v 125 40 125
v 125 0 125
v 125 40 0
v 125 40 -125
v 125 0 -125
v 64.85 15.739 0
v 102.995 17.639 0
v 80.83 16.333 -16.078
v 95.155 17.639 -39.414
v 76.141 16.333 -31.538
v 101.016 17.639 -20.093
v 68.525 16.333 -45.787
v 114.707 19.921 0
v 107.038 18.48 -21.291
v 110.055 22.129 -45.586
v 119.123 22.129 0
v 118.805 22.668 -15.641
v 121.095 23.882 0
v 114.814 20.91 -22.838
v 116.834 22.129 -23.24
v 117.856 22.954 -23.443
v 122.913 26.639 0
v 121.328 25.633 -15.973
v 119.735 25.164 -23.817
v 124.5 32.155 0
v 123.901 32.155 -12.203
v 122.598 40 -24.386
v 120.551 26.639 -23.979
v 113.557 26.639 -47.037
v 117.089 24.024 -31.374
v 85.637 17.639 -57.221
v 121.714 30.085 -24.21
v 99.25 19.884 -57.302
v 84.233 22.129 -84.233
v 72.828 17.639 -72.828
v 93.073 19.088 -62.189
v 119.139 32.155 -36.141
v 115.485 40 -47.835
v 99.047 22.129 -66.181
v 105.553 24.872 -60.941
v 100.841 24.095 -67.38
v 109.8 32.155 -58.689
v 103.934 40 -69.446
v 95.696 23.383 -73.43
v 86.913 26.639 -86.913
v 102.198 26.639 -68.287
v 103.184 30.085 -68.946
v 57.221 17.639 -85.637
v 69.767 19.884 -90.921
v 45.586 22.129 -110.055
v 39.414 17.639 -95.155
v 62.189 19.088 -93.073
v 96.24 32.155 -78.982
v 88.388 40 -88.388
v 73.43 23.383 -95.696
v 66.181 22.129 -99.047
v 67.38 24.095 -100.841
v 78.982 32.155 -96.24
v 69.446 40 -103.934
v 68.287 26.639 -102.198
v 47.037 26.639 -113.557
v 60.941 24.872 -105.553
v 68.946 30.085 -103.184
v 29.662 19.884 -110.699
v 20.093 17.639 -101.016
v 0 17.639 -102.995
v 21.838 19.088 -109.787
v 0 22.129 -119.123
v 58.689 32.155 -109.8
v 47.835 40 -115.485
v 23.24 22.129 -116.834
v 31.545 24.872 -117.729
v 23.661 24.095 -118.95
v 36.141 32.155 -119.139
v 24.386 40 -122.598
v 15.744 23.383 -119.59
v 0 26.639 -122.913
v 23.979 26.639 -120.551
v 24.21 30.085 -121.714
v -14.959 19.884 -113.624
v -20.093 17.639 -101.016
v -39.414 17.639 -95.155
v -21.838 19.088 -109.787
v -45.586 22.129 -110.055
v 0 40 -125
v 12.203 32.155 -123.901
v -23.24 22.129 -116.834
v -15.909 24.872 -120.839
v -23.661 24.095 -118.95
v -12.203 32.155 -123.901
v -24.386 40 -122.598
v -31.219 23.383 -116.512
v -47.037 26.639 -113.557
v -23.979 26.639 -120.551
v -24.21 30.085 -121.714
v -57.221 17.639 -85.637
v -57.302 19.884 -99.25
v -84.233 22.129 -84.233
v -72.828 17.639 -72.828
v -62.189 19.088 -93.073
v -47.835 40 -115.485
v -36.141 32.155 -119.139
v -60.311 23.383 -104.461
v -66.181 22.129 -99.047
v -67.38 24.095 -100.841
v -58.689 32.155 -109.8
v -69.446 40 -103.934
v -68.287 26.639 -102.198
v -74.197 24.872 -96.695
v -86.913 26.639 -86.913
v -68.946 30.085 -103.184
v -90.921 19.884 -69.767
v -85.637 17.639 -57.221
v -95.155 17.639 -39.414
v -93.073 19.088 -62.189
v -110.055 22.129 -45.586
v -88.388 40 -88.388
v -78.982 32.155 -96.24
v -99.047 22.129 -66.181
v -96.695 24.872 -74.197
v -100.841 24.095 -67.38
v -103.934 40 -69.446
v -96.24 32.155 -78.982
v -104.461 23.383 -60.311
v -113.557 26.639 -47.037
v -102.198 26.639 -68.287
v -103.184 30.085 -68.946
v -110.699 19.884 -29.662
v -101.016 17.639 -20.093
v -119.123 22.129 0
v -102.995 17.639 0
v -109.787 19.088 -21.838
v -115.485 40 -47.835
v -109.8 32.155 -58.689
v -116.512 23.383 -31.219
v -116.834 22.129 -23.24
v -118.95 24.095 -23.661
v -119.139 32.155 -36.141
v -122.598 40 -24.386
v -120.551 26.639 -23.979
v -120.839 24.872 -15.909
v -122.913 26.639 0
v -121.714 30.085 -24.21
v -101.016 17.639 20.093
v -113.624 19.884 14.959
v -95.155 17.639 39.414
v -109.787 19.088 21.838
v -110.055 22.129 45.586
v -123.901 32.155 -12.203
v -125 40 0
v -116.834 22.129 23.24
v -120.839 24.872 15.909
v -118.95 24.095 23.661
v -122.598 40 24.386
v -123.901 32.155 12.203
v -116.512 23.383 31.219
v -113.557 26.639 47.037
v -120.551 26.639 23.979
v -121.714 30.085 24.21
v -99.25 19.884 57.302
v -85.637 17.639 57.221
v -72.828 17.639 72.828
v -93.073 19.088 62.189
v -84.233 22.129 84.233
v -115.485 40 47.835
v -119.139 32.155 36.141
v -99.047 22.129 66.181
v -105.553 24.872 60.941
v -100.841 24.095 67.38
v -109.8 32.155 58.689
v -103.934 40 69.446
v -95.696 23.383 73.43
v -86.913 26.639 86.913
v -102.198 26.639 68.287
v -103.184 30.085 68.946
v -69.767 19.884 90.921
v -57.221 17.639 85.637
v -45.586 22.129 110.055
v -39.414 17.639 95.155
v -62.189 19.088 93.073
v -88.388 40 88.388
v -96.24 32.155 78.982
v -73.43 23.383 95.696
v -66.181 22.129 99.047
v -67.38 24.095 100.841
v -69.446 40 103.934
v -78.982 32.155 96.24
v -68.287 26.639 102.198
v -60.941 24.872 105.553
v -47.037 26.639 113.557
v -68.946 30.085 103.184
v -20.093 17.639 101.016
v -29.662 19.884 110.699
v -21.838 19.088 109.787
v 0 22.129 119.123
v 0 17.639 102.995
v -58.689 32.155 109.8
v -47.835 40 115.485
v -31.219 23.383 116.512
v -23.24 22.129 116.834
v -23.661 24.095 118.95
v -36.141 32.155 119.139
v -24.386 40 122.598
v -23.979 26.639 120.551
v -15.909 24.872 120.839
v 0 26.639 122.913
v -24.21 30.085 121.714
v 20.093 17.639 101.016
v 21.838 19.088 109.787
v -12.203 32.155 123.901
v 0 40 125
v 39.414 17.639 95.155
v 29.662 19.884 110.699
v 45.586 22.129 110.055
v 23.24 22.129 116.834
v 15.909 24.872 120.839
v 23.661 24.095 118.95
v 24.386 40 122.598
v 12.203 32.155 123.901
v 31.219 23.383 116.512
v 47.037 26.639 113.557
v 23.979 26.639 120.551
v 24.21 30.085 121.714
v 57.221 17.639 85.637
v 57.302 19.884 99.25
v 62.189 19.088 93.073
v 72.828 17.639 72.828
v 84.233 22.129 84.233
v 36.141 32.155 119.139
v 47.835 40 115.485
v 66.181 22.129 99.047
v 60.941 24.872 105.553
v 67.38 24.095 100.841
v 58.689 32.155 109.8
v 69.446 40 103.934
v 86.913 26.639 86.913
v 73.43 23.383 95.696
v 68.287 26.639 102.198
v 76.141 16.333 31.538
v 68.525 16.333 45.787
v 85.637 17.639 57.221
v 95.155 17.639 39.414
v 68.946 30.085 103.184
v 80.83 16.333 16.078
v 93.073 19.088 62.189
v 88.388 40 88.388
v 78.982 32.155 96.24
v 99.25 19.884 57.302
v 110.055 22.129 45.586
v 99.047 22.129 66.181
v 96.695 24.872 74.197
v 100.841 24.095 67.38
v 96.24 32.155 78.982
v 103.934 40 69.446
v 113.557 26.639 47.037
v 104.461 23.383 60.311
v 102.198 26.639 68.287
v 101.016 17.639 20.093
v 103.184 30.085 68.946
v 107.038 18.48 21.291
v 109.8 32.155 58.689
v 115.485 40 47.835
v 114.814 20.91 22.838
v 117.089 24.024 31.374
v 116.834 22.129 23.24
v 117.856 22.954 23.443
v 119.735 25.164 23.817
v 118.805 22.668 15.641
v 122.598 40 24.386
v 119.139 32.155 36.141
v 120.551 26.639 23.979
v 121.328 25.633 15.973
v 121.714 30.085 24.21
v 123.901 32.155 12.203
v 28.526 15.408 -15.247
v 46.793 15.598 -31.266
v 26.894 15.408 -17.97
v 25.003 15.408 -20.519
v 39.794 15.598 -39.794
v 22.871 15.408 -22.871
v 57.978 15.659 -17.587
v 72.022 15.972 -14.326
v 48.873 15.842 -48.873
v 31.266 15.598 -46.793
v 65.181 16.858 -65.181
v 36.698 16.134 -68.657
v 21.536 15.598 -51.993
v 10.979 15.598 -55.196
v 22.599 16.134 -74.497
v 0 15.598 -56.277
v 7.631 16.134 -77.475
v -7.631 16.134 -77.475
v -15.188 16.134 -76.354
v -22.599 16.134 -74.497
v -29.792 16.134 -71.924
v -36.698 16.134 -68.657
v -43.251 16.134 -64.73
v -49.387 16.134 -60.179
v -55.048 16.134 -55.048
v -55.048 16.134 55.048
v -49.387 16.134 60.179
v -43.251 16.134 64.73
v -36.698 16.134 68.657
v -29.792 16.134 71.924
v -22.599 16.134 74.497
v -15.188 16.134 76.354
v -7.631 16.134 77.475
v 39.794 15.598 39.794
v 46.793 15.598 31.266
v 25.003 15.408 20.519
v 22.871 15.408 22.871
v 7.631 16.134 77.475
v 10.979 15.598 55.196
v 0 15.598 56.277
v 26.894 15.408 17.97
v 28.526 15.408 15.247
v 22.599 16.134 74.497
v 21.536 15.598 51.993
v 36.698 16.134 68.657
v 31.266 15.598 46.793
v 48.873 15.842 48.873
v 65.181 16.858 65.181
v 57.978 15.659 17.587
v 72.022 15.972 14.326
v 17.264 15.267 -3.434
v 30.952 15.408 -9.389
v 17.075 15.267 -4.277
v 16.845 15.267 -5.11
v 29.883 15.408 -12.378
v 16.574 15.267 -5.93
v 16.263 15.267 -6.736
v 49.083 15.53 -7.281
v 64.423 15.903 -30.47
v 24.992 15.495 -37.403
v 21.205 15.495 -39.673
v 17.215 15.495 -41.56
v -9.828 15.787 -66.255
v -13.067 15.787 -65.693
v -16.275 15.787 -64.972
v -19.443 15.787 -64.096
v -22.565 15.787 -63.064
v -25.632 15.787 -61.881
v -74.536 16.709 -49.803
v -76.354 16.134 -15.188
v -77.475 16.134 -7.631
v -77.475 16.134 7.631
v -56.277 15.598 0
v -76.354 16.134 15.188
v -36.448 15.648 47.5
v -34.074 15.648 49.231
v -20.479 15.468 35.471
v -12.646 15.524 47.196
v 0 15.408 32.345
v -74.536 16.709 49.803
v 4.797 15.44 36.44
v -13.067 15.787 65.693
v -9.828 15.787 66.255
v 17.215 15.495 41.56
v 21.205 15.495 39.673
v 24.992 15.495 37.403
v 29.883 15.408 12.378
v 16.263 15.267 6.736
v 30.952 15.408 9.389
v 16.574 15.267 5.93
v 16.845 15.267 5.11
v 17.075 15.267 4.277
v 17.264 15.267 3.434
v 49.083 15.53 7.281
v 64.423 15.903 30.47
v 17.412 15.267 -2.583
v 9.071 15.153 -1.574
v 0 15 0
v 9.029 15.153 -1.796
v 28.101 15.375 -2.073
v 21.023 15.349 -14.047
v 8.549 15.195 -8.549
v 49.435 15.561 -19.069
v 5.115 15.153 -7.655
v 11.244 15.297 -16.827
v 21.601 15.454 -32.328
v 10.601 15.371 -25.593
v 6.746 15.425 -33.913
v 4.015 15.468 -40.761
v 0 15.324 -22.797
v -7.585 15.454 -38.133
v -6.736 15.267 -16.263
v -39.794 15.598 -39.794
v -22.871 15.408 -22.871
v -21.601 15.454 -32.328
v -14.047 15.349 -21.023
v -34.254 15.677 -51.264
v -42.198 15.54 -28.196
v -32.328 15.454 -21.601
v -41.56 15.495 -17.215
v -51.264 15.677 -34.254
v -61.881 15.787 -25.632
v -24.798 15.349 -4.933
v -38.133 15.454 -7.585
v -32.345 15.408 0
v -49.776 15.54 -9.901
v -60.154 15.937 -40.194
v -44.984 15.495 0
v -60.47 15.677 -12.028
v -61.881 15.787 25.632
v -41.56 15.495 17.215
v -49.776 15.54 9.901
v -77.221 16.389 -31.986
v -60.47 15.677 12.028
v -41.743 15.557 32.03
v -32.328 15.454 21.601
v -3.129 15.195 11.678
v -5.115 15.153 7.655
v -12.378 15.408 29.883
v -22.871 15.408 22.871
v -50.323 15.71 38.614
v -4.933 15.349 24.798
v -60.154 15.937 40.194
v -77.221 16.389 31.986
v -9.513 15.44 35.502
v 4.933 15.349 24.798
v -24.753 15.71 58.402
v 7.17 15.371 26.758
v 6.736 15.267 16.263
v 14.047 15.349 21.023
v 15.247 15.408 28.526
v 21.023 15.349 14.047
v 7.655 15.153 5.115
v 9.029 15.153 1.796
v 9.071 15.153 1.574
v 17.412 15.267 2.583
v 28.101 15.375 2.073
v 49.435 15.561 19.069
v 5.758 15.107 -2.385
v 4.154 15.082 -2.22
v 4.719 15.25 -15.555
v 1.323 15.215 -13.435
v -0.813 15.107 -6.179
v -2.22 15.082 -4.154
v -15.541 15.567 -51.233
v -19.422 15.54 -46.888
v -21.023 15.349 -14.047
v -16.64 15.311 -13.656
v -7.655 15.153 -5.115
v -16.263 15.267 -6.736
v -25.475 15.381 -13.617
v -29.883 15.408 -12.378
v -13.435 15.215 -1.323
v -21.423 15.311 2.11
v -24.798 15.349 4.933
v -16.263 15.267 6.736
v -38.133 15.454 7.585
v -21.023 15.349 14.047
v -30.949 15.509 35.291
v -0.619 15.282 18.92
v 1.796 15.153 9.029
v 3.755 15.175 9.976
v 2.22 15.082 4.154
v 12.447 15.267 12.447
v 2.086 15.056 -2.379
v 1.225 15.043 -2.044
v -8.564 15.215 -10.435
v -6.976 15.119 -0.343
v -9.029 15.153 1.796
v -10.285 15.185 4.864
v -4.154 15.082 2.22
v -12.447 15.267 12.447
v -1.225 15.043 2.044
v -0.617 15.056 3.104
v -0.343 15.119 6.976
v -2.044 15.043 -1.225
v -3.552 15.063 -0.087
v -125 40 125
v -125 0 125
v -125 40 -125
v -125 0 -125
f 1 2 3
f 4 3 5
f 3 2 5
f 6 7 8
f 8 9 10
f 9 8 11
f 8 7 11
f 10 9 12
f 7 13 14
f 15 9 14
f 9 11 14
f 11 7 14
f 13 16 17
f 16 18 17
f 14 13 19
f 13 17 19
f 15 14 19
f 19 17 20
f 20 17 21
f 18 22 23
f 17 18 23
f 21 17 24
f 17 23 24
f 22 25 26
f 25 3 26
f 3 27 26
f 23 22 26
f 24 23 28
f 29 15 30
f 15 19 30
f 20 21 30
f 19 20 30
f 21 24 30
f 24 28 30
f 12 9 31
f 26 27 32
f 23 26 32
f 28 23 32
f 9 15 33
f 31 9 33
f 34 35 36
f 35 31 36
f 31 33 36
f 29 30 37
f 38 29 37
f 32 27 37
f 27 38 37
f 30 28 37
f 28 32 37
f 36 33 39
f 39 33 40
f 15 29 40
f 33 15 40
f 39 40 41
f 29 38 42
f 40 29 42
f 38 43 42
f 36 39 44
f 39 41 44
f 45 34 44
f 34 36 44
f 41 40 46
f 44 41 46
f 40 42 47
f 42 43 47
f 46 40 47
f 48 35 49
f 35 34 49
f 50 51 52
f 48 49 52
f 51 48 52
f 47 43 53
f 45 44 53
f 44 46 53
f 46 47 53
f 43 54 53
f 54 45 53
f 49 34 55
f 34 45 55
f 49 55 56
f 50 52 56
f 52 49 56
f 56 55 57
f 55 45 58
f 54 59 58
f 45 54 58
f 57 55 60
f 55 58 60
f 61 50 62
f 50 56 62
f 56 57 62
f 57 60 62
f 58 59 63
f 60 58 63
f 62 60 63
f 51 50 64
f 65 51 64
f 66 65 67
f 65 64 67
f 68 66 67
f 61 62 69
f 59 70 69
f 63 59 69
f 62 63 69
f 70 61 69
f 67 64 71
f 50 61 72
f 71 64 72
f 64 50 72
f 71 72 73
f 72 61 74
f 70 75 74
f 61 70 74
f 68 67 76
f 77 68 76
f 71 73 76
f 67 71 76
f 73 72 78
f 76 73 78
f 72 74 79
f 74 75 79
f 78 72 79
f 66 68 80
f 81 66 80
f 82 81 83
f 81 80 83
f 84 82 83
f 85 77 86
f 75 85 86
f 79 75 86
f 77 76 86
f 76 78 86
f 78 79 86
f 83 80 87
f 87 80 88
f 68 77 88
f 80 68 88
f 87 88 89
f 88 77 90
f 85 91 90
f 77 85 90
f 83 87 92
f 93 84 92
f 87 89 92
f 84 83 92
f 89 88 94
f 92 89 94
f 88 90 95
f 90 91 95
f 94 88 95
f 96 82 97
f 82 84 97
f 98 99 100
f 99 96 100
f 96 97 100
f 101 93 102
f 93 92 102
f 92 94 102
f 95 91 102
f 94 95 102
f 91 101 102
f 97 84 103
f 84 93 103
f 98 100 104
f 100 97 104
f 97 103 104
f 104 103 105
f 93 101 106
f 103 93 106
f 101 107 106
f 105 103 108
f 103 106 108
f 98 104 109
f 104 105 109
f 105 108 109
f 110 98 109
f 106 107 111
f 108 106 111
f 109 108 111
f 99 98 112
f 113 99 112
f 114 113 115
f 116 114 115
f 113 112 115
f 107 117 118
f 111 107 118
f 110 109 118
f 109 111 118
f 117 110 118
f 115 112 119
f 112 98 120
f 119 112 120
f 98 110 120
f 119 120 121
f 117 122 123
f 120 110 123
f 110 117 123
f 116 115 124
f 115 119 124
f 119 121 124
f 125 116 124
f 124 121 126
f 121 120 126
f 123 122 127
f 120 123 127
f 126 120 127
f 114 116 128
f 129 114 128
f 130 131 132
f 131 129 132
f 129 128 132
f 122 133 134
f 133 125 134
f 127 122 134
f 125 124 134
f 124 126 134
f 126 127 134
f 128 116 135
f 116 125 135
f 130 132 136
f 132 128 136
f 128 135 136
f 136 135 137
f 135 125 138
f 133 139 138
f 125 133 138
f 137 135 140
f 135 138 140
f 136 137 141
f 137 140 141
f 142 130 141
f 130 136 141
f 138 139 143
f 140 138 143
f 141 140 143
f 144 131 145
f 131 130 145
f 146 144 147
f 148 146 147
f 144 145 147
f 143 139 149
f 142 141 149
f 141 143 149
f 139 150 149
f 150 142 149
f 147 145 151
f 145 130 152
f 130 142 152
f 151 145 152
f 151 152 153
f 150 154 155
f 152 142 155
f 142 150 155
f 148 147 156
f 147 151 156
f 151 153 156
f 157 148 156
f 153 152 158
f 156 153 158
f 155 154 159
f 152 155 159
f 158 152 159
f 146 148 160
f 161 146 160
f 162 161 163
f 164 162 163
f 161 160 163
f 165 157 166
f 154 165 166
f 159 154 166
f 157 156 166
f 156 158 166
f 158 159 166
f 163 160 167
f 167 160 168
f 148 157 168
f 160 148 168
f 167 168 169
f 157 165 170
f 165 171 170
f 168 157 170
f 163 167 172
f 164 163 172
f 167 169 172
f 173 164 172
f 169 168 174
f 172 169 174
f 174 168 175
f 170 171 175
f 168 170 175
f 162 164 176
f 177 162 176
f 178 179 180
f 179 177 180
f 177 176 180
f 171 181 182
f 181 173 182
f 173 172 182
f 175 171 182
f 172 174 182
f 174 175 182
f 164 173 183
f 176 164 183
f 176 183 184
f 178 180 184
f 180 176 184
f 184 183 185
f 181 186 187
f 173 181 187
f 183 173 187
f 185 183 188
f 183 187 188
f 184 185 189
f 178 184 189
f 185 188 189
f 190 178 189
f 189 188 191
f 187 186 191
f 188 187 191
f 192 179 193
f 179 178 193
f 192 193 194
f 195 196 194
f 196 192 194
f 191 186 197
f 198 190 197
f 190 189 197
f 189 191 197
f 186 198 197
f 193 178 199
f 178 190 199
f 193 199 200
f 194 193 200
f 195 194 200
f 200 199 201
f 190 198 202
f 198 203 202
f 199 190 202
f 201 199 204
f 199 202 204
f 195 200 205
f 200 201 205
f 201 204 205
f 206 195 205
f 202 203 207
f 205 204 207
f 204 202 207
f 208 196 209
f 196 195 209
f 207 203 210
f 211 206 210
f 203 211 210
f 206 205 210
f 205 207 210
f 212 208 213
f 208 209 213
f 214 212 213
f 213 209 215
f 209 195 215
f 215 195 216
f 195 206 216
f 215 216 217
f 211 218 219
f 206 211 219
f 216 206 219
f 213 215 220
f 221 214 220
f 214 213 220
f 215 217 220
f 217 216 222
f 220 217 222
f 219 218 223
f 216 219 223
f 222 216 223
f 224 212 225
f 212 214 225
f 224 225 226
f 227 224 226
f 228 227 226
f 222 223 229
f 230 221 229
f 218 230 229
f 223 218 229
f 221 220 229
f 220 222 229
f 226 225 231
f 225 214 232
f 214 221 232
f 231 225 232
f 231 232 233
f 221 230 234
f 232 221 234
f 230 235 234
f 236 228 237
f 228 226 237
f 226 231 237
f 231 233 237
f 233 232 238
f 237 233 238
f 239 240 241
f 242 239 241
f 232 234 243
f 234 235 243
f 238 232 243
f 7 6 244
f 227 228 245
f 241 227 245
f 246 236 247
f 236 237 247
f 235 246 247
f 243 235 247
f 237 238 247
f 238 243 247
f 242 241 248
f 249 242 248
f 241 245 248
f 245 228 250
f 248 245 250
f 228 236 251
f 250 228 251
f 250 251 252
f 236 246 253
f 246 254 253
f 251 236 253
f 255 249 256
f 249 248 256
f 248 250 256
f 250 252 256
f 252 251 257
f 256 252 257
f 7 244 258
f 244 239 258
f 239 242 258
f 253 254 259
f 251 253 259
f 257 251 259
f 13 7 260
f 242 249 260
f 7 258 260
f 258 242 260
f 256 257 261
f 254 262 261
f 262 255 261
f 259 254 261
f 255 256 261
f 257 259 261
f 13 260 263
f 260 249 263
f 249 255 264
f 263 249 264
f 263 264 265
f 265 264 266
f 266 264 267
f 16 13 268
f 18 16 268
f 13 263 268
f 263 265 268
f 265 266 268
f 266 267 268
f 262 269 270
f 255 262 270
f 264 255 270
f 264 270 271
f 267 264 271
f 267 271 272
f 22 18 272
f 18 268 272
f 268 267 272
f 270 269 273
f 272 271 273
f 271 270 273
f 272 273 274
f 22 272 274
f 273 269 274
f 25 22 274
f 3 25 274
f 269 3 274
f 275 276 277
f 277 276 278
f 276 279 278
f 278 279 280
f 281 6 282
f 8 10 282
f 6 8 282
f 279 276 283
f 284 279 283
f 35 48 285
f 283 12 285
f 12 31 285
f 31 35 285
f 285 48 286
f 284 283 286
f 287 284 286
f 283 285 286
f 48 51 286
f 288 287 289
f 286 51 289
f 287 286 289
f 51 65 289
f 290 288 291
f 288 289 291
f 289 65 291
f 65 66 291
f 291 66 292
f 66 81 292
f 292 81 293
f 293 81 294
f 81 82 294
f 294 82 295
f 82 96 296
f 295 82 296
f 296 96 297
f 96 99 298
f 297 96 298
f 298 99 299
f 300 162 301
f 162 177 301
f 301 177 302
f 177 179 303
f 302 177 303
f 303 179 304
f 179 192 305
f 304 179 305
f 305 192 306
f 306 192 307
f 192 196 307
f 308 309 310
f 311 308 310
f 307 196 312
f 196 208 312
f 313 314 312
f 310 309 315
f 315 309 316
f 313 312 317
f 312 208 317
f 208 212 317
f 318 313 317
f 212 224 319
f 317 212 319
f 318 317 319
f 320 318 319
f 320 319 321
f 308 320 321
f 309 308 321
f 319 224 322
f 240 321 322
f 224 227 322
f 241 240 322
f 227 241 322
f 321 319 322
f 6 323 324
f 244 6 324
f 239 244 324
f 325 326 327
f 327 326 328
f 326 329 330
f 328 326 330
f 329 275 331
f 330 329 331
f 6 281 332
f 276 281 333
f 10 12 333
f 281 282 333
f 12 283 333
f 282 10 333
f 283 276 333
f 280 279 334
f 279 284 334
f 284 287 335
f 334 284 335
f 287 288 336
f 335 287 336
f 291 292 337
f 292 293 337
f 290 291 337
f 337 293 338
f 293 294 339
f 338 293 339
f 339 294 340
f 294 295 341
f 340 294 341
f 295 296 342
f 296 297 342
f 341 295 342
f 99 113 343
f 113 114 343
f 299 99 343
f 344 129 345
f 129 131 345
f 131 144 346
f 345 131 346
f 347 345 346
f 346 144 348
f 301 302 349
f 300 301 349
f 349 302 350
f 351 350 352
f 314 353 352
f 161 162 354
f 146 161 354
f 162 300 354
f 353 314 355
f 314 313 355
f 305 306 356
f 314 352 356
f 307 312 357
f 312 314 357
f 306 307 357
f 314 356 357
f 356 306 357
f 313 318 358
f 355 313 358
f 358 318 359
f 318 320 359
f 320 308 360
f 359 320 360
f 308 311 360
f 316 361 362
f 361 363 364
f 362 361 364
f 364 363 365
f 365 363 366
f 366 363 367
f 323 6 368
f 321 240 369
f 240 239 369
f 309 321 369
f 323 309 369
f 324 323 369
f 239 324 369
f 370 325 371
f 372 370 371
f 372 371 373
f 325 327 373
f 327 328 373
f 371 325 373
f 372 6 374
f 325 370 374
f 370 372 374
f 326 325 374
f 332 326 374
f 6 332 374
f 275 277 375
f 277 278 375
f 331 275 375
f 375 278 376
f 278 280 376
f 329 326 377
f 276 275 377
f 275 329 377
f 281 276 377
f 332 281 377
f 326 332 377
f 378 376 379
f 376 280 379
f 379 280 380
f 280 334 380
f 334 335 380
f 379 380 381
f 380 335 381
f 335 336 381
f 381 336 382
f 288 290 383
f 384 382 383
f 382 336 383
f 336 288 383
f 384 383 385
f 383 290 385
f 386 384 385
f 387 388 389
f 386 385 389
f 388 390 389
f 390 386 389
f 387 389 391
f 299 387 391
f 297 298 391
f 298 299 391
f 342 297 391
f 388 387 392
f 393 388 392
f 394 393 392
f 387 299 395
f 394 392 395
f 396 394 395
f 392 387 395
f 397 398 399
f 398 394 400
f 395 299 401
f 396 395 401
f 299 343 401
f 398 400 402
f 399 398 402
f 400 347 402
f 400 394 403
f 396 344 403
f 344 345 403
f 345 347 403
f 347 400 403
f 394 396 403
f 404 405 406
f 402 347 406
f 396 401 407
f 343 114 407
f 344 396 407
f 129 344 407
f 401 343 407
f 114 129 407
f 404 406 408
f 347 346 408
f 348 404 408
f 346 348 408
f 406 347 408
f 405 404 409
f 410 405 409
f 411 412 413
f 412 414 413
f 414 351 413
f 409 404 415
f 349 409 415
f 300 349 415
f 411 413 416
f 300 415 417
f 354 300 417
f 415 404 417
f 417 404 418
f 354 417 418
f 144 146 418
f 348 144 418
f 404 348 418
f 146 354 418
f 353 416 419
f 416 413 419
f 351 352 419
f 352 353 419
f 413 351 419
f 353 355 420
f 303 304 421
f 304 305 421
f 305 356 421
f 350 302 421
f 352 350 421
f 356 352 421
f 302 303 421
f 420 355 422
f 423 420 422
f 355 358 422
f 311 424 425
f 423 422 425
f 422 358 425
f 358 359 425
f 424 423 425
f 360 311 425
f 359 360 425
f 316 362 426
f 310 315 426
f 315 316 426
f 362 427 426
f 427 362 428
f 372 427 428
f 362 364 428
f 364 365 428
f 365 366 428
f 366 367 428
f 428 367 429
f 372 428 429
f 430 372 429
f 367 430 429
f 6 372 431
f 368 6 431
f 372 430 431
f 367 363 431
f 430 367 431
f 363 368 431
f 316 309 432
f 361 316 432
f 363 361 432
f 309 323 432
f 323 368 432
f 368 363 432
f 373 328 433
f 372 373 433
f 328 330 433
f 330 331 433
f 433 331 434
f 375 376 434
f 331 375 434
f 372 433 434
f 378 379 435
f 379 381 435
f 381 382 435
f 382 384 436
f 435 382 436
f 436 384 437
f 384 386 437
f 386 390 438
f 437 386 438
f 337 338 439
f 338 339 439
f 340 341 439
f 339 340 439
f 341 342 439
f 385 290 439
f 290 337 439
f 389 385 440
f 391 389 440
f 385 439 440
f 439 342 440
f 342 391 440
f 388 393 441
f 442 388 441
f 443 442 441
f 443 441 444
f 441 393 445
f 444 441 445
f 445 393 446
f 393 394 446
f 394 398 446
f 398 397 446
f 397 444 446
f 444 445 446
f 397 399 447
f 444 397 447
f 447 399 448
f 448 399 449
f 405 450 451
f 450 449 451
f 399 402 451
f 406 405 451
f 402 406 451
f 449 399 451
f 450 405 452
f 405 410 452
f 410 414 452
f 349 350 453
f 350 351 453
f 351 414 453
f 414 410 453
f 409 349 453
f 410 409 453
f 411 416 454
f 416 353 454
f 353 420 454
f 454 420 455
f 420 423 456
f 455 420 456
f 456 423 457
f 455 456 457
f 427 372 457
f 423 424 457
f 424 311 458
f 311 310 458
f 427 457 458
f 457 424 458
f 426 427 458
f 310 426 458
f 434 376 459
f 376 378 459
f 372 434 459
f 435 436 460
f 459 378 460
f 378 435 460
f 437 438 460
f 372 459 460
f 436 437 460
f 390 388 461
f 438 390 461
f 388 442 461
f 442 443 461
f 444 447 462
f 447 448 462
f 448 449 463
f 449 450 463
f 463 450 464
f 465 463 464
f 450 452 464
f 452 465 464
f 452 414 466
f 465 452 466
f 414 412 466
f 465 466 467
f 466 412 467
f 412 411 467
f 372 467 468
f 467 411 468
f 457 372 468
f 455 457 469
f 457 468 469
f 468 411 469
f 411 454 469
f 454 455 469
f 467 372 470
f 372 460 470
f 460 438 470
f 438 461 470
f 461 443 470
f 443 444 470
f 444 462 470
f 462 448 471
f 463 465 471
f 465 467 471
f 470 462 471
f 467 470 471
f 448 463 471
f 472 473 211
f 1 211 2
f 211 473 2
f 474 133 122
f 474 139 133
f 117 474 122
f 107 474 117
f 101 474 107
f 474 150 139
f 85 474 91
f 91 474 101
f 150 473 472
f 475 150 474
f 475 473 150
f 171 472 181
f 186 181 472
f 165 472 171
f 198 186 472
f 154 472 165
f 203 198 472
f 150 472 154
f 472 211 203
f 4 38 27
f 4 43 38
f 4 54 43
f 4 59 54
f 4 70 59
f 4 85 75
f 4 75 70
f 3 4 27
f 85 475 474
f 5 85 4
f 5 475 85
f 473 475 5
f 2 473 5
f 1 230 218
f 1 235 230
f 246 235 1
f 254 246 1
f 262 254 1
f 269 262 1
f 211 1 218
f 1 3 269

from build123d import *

# Parameters (mm, degrees)
SKETCH1_W           = 250
SKETCH1_H           = 250
BOSS_EXTRUDE1_DEPTH = 40


with BuildPart() as part:
    # Sketch1 → Boss-Extrude1 (new body)
    with BuildSketch(Plane(origin=(0, 0, 0), x_dir=(1, 0, 0), z_dir=(0, 1, 0))):
        Rectangle(SKETCH1_W, SKETCH1_H)
    extrude(amount=BOSS_EXTRUDE1_DEPTH)

    # Sketch2 → Cut-Revolve2 (revolve, cut)
    with BuildSketch(Plane.XY):
        with BuildLine():
            Line((0, 15), (0, 63.116181733))
            Line((0, 63.116181733), (125, 40))
            add(Edge.make_bspline(
                [(0, 15), (48.1962468, 15.882356201), (65.959558565, 14.697330468), (121.032855803, 18.917893375), (125, 29.712177283), (125, 40)],
                knots=[0, 0, 0, 0, 0.694215698, 0.861705648, 1, 1, 1, 1], degree=3))
        make_face()
    revolve(axis=Axis((0, 15, 0), (0, 1, 0)), mode=Mode.SUBTRACT)


solid = part.part
